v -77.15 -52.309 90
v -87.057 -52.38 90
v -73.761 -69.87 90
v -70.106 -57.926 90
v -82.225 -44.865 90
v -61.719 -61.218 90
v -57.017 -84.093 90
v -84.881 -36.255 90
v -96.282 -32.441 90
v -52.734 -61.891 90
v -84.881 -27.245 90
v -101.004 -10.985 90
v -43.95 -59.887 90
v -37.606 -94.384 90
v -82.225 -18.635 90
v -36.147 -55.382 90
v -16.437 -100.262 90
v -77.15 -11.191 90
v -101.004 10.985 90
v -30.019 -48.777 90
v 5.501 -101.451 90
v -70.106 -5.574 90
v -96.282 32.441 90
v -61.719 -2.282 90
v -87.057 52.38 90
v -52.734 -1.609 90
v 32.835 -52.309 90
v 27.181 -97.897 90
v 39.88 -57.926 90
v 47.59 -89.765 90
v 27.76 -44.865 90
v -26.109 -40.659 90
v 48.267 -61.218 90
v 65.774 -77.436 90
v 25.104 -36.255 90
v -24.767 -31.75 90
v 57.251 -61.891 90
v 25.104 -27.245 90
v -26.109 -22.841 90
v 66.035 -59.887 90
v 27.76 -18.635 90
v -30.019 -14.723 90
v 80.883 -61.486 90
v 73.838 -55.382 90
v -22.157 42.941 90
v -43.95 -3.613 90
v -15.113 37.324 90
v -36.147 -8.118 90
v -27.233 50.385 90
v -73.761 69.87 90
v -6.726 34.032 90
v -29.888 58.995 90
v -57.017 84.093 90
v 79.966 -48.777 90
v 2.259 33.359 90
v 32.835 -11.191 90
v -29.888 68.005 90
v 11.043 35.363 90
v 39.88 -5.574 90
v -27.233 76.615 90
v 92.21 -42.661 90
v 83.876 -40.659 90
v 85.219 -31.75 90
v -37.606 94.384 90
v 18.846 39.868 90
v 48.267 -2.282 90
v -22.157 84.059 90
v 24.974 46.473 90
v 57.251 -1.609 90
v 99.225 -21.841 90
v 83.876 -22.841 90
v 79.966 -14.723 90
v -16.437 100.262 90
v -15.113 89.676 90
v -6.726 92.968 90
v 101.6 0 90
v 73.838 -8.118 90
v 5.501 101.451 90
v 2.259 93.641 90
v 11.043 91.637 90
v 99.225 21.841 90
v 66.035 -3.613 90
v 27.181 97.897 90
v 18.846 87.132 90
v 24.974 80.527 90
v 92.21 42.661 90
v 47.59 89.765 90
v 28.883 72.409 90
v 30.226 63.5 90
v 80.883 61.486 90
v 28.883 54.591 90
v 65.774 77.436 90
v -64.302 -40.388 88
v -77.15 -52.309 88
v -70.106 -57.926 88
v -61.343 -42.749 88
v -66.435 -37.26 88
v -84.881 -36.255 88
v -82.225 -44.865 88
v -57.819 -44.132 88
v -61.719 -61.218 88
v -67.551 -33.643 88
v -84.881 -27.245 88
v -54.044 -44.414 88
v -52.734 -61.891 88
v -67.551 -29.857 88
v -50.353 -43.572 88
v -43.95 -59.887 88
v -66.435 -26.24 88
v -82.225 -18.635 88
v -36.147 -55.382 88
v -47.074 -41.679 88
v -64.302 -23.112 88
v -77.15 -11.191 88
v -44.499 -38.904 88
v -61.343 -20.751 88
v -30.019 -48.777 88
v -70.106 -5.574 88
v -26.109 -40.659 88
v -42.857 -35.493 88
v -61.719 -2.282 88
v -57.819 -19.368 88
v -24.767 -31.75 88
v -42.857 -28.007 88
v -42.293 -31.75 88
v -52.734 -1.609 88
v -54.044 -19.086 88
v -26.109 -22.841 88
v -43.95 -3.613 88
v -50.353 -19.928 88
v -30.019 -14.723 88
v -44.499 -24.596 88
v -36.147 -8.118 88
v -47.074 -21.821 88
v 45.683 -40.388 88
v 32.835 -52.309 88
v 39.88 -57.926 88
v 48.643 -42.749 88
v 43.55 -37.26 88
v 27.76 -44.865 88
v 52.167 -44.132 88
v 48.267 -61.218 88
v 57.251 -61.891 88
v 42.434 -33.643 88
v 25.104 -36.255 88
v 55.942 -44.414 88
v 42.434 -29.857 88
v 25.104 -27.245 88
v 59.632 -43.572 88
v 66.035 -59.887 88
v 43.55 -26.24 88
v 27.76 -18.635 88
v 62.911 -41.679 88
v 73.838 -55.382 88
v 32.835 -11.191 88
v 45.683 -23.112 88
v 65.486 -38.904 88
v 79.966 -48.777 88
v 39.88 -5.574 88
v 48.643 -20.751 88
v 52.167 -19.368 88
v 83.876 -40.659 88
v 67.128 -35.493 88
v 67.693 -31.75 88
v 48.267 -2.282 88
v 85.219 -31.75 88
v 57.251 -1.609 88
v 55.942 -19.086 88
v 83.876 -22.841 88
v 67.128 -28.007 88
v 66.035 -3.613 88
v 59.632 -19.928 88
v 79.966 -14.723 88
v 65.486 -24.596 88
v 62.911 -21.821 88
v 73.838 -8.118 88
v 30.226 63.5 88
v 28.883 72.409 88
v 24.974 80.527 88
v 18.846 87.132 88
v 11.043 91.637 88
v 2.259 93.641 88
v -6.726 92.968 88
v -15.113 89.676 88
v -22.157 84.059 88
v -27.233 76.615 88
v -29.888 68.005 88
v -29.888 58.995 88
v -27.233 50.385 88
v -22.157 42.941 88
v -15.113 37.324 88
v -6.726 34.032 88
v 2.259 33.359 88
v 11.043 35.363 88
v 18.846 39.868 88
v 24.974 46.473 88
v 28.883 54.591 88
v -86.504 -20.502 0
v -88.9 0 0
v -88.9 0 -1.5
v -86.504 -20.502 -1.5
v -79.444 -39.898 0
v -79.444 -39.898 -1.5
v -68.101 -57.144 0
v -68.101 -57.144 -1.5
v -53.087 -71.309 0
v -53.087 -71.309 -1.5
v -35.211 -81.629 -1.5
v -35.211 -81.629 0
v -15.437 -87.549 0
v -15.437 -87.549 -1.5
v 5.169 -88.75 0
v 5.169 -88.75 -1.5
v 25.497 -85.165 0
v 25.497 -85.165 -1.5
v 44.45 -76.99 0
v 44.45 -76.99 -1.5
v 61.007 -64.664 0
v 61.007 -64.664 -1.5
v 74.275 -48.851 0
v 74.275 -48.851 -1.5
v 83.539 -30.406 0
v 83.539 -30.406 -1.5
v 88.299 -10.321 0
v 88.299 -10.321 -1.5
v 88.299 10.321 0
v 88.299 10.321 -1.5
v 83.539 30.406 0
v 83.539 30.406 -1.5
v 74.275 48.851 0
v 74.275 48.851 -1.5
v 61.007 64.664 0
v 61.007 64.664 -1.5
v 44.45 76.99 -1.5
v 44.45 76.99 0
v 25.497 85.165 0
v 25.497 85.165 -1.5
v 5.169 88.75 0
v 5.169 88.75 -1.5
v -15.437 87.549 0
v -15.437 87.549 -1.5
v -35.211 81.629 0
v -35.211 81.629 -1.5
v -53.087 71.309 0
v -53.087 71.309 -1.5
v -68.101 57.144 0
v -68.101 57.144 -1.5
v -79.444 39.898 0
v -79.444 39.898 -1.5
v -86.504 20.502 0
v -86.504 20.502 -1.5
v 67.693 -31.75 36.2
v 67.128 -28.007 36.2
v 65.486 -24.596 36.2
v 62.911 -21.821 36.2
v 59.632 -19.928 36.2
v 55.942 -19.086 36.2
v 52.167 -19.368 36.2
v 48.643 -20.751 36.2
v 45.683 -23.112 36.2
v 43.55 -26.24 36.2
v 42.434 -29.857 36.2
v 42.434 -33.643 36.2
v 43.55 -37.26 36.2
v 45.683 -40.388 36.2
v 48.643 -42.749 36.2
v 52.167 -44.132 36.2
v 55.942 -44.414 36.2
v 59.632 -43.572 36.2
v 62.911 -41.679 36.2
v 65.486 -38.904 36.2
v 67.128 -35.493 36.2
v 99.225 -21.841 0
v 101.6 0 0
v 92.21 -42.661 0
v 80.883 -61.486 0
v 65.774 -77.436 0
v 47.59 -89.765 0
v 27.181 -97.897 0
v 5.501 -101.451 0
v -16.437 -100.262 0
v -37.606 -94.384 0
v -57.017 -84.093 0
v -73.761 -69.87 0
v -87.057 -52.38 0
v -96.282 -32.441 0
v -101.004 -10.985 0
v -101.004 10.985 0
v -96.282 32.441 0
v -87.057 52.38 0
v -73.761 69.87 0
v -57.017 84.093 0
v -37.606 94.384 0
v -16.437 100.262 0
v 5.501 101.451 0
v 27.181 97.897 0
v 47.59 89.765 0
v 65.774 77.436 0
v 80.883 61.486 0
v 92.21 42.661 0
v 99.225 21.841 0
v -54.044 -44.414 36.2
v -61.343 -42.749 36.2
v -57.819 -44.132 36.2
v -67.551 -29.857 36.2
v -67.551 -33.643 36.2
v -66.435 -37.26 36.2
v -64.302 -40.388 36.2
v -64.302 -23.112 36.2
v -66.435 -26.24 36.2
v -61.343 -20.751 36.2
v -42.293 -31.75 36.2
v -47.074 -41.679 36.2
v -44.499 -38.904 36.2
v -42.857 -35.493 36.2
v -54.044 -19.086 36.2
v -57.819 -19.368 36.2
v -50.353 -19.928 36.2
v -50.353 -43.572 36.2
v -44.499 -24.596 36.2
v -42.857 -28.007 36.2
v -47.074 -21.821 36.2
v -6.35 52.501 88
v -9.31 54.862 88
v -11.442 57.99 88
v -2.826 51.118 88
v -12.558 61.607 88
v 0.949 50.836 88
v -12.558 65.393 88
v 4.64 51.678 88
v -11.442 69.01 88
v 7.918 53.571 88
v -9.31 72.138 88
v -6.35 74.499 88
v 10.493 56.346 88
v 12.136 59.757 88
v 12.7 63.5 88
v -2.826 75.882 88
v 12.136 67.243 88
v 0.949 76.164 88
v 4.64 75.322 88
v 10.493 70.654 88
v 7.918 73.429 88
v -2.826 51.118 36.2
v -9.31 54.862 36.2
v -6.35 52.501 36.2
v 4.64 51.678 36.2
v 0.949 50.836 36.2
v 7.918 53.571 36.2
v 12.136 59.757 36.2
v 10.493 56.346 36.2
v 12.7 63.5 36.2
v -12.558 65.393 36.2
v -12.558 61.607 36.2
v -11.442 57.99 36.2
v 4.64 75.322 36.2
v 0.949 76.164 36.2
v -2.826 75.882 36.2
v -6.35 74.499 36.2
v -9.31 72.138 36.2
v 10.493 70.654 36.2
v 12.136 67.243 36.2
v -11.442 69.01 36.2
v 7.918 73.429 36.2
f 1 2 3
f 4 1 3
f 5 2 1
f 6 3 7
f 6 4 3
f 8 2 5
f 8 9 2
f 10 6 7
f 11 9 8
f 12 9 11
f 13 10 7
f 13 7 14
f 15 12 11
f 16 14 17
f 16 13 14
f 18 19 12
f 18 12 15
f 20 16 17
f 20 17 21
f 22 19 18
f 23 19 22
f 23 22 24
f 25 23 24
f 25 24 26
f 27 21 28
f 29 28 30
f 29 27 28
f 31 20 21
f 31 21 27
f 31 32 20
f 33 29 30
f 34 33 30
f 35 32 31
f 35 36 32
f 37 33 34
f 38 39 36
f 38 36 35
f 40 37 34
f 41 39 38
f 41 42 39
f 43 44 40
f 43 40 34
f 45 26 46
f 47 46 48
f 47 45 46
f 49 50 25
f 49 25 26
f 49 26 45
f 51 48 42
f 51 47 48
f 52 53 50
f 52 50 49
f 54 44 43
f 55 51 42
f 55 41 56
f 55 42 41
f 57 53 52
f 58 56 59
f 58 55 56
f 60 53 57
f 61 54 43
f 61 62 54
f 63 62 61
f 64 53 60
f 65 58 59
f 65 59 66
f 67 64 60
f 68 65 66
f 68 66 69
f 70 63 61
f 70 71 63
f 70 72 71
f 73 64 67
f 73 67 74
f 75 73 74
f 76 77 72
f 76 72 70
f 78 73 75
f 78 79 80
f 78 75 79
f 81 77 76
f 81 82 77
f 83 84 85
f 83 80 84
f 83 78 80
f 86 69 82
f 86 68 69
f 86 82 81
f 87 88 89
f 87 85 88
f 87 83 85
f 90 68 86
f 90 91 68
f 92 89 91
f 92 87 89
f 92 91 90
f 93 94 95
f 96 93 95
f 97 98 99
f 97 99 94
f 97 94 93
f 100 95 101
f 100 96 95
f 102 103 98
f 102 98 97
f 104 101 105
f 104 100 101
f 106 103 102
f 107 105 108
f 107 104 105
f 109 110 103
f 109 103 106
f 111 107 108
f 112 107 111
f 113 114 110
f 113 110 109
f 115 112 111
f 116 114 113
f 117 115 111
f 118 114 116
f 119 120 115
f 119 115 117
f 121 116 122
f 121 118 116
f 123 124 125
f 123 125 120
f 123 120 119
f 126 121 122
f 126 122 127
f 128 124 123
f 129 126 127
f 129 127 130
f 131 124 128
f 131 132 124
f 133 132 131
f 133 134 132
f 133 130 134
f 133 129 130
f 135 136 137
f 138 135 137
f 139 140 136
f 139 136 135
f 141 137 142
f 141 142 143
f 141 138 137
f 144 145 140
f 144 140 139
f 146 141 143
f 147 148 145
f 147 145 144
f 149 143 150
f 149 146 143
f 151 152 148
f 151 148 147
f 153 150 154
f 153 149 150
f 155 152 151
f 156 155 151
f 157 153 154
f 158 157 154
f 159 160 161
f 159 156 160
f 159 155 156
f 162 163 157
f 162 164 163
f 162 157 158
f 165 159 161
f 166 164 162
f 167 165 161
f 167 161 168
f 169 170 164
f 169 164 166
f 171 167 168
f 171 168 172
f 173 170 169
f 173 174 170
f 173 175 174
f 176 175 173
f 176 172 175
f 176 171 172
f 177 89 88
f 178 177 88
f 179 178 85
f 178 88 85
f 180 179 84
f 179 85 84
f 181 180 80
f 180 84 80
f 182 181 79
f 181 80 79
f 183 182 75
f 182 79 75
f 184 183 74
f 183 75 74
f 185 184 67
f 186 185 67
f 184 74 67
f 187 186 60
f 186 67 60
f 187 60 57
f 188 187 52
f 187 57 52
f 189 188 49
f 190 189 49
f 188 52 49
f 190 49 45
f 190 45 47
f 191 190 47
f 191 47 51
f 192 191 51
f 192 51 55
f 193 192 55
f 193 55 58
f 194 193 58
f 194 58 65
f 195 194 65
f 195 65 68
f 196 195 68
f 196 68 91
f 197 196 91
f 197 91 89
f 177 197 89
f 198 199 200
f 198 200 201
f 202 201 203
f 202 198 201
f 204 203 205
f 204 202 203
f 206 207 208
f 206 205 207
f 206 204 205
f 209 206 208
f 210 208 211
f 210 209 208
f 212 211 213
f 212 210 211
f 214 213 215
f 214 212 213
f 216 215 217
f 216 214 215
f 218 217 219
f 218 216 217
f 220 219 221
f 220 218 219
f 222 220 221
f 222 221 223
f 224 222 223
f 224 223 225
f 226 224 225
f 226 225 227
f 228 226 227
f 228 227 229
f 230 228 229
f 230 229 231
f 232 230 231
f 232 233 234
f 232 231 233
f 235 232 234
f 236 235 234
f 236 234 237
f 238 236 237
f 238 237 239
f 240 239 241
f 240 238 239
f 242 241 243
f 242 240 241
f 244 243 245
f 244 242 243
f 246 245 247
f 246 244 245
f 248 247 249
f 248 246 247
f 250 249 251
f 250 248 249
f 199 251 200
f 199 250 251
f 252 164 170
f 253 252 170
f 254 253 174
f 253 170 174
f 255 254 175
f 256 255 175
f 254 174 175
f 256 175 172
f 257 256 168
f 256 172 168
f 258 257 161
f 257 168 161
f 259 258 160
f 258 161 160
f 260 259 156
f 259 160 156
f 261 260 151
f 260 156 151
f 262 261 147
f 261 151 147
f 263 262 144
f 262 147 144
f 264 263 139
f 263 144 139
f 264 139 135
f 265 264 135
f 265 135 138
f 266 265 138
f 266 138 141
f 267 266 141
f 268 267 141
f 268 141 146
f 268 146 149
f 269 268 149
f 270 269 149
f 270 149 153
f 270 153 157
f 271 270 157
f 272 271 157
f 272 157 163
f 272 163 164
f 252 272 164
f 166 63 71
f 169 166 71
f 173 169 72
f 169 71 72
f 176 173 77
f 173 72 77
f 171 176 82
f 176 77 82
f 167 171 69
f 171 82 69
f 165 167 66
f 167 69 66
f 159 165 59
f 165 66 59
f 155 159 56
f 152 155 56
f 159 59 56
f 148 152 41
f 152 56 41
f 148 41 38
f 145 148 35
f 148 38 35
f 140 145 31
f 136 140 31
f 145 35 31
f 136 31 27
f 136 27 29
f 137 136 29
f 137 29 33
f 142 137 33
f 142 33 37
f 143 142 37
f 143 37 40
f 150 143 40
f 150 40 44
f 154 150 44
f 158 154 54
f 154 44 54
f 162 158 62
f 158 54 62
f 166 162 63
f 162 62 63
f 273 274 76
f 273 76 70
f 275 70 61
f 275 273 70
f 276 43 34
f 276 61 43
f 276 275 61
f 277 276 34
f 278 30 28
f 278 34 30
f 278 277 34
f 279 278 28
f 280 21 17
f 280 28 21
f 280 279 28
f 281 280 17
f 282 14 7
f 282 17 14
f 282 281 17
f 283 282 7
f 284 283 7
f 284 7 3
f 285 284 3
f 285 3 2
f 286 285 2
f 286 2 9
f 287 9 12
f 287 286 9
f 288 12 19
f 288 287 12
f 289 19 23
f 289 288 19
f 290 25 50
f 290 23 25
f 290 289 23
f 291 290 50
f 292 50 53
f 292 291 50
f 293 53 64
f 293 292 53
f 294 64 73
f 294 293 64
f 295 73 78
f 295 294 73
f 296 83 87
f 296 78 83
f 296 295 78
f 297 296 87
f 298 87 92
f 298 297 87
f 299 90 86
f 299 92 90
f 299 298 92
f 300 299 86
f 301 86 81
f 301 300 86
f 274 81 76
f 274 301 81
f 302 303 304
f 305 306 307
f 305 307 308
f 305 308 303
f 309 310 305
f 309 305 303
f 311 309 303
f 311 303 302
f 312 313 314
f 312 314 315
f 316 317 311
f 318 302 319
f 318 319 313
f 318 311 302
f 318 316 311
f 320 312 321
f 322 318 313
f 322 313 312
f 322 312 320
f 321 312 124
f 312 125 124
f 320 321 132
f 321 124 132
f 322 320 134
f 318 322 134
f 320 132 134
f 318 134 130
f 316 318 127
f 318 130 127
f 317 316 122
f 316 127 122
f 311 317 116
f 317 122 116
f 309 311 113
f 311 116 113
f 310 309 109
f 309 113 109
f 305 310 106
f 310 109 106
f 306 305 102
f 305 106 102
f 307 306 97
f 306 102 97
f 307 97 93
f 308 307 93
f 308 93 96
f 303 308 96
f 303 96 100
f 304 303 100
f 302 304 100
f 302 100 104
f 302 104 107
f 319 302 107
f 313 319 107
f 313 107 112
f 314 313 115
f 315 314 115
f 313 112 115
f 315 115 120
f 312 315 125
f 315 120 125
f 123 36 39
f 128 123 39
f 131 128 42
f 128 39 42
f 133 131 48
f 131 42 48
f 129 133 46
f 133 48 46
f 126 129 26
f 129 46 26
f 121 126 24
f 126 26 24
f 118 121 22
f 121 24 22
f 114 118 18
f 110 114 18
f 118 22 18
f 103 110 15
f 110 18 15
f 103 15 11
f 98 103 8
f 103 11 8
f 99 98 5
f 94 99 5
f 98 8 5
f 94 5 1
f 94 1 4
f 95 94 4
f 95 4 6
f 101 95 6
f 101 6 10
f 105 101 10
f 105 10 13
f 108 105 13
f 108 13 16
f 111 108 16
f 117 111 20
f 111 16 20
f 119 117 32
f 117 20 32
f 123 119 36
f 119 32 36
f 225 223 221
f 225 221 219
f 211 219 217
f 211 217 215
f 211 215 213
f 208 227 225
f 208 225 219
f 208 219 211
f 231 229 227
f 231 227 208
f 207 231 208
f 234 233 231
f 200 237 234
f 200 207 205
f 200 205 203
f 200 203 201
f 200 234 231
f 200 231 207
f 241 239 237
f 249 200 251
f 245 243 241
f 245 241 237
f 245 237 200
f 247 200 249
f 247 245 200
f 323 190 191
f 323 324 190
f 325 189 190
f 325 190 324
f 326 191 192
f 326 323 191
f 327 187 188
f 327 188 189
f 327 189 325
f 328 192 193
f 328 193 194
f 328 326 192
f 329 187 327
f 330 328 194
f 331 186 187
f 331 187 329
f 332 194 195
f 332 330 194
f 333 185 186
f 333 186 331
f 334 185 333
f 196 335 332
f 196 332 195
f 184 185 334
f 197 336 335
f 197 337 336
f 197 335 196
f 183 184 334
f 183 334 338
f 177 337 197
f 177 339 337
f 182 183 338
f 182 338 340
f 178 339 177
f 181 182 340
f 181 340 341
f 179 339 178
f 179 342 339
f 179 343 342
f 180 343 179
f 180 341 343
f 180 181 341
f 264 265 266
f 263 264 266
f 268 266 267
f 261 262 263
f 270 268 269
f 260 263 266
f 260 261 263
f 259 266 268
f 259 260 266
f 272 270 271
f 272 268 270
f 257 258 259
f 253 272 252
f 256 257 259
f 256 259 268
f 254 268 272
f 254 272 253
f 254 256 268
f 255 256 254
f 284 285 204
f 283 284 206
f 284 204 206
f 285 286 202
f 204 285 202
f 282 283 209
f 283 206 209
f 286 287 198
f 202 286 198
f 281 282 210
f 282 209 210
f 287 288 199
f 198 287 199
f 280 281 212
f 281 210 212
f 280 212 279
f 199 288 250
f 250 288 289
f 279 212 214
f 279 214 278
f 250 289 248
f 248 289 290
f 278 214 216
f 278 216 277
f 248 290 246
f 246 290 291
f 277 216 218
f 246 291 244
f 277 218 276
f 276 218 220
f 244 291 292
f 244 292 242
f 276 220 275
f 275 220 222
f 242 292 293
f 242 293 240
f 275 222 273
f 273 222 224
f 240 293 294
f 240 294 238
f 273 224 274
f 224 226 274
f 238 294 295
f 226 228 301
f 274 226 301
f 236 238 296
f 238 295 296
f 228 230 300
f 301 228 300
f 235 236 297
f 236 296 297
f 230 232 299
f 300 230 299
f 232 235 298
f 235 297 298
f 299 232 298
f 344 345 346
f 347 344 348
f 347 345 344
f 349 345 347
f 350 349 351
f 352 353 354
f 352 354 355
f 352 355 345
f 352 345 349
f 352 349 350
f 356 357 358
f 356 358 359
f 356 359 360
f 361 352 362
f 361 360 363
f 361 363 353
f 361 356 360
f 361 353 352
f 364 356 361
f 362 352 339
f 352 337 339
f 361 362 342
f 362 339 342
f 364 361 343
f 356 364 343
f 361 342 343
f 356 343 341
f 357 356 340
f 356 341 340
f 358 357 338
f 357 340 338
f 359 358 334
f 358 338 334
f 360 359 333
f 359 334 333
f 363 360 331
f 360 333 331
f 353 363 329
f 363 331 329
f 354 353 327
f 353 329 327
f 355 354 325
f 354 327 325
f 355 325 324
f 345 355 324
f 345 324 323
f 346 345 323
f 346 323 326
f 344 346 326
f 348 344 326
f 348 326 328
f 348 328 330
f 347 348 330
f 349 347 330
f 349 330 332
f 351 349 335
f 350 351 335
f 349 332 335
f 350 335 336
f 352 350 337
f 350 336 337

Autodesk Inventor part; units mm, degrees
ref_plane "YZ Plane" through (0, 0, 0) normal (1, 0, 0) x (0, 1, 0)
ref_plane "XZ Plane" through (0, 0, 0) normal (0, 1, 0) x (-1, 0, 0)
ref_plane "XY Plane" through (0, 0, 0) normal (0, 0, 1) x (1, 0, 0)
sketch "Sketch1" plane through (0, 0, 0) normal (0, 0, 1) x (1, 0, 0)
  circle A0 centre (0, 0) radius 101.6
  dimension "d10" = 203.2
extrude "Extrusion1" add sketch "Sketch1" along normal blind 90
sketch "Sketch2" plane through (0, 0, 90) normal (0, 0, 1) x (1, 0, 0)
  circle A0 centre (0, 63.5) radius 30.226
  circle A1 centre (-54.9926, -31.75) radius 30.226
  circle A2 centre (54.9926, -31.75) radius 30.226
  point P0 (0, 0)
  dimension "d4" = 360
  dimension "d11" = 63.5
  dimension "d12" = 60.452
extrude "Extrusion2" cut sketch "Sketch2" against normal blind 2
sketch "Sketch5" plane through (0, 0, 0) normal (0, 0, -1) x (-1, 0, 0)
  circle A0 centre (0, 0) radius 88.9
  dimension "d13" = 177.8
extrude "Extrusion4" add sketch "Sketch5" along normal blind 1.5
sketch "Sketch6" plane through (0, 0, 90) normal (0, 0, 1) x (1, 0, 0)
  circle A0 centre (54.9926, -31.75) radius 30.226 projected
  circle A1 centre (54.9926, -31.75) radius 12.7
  circle A2 centre (0, 63.5) radius 12.7
  circle A3 centre (-54.9926, -31.75) radius 12.7
  point P0 (0, 0)
  dimension "d16" = 25.4
  dimension "d19" = 360
extrude "Extrusion5" cut sketch "Sketch6" against normal blind 53.8 contours A1 | A2 | A3
properties part number "membrane_mold"
